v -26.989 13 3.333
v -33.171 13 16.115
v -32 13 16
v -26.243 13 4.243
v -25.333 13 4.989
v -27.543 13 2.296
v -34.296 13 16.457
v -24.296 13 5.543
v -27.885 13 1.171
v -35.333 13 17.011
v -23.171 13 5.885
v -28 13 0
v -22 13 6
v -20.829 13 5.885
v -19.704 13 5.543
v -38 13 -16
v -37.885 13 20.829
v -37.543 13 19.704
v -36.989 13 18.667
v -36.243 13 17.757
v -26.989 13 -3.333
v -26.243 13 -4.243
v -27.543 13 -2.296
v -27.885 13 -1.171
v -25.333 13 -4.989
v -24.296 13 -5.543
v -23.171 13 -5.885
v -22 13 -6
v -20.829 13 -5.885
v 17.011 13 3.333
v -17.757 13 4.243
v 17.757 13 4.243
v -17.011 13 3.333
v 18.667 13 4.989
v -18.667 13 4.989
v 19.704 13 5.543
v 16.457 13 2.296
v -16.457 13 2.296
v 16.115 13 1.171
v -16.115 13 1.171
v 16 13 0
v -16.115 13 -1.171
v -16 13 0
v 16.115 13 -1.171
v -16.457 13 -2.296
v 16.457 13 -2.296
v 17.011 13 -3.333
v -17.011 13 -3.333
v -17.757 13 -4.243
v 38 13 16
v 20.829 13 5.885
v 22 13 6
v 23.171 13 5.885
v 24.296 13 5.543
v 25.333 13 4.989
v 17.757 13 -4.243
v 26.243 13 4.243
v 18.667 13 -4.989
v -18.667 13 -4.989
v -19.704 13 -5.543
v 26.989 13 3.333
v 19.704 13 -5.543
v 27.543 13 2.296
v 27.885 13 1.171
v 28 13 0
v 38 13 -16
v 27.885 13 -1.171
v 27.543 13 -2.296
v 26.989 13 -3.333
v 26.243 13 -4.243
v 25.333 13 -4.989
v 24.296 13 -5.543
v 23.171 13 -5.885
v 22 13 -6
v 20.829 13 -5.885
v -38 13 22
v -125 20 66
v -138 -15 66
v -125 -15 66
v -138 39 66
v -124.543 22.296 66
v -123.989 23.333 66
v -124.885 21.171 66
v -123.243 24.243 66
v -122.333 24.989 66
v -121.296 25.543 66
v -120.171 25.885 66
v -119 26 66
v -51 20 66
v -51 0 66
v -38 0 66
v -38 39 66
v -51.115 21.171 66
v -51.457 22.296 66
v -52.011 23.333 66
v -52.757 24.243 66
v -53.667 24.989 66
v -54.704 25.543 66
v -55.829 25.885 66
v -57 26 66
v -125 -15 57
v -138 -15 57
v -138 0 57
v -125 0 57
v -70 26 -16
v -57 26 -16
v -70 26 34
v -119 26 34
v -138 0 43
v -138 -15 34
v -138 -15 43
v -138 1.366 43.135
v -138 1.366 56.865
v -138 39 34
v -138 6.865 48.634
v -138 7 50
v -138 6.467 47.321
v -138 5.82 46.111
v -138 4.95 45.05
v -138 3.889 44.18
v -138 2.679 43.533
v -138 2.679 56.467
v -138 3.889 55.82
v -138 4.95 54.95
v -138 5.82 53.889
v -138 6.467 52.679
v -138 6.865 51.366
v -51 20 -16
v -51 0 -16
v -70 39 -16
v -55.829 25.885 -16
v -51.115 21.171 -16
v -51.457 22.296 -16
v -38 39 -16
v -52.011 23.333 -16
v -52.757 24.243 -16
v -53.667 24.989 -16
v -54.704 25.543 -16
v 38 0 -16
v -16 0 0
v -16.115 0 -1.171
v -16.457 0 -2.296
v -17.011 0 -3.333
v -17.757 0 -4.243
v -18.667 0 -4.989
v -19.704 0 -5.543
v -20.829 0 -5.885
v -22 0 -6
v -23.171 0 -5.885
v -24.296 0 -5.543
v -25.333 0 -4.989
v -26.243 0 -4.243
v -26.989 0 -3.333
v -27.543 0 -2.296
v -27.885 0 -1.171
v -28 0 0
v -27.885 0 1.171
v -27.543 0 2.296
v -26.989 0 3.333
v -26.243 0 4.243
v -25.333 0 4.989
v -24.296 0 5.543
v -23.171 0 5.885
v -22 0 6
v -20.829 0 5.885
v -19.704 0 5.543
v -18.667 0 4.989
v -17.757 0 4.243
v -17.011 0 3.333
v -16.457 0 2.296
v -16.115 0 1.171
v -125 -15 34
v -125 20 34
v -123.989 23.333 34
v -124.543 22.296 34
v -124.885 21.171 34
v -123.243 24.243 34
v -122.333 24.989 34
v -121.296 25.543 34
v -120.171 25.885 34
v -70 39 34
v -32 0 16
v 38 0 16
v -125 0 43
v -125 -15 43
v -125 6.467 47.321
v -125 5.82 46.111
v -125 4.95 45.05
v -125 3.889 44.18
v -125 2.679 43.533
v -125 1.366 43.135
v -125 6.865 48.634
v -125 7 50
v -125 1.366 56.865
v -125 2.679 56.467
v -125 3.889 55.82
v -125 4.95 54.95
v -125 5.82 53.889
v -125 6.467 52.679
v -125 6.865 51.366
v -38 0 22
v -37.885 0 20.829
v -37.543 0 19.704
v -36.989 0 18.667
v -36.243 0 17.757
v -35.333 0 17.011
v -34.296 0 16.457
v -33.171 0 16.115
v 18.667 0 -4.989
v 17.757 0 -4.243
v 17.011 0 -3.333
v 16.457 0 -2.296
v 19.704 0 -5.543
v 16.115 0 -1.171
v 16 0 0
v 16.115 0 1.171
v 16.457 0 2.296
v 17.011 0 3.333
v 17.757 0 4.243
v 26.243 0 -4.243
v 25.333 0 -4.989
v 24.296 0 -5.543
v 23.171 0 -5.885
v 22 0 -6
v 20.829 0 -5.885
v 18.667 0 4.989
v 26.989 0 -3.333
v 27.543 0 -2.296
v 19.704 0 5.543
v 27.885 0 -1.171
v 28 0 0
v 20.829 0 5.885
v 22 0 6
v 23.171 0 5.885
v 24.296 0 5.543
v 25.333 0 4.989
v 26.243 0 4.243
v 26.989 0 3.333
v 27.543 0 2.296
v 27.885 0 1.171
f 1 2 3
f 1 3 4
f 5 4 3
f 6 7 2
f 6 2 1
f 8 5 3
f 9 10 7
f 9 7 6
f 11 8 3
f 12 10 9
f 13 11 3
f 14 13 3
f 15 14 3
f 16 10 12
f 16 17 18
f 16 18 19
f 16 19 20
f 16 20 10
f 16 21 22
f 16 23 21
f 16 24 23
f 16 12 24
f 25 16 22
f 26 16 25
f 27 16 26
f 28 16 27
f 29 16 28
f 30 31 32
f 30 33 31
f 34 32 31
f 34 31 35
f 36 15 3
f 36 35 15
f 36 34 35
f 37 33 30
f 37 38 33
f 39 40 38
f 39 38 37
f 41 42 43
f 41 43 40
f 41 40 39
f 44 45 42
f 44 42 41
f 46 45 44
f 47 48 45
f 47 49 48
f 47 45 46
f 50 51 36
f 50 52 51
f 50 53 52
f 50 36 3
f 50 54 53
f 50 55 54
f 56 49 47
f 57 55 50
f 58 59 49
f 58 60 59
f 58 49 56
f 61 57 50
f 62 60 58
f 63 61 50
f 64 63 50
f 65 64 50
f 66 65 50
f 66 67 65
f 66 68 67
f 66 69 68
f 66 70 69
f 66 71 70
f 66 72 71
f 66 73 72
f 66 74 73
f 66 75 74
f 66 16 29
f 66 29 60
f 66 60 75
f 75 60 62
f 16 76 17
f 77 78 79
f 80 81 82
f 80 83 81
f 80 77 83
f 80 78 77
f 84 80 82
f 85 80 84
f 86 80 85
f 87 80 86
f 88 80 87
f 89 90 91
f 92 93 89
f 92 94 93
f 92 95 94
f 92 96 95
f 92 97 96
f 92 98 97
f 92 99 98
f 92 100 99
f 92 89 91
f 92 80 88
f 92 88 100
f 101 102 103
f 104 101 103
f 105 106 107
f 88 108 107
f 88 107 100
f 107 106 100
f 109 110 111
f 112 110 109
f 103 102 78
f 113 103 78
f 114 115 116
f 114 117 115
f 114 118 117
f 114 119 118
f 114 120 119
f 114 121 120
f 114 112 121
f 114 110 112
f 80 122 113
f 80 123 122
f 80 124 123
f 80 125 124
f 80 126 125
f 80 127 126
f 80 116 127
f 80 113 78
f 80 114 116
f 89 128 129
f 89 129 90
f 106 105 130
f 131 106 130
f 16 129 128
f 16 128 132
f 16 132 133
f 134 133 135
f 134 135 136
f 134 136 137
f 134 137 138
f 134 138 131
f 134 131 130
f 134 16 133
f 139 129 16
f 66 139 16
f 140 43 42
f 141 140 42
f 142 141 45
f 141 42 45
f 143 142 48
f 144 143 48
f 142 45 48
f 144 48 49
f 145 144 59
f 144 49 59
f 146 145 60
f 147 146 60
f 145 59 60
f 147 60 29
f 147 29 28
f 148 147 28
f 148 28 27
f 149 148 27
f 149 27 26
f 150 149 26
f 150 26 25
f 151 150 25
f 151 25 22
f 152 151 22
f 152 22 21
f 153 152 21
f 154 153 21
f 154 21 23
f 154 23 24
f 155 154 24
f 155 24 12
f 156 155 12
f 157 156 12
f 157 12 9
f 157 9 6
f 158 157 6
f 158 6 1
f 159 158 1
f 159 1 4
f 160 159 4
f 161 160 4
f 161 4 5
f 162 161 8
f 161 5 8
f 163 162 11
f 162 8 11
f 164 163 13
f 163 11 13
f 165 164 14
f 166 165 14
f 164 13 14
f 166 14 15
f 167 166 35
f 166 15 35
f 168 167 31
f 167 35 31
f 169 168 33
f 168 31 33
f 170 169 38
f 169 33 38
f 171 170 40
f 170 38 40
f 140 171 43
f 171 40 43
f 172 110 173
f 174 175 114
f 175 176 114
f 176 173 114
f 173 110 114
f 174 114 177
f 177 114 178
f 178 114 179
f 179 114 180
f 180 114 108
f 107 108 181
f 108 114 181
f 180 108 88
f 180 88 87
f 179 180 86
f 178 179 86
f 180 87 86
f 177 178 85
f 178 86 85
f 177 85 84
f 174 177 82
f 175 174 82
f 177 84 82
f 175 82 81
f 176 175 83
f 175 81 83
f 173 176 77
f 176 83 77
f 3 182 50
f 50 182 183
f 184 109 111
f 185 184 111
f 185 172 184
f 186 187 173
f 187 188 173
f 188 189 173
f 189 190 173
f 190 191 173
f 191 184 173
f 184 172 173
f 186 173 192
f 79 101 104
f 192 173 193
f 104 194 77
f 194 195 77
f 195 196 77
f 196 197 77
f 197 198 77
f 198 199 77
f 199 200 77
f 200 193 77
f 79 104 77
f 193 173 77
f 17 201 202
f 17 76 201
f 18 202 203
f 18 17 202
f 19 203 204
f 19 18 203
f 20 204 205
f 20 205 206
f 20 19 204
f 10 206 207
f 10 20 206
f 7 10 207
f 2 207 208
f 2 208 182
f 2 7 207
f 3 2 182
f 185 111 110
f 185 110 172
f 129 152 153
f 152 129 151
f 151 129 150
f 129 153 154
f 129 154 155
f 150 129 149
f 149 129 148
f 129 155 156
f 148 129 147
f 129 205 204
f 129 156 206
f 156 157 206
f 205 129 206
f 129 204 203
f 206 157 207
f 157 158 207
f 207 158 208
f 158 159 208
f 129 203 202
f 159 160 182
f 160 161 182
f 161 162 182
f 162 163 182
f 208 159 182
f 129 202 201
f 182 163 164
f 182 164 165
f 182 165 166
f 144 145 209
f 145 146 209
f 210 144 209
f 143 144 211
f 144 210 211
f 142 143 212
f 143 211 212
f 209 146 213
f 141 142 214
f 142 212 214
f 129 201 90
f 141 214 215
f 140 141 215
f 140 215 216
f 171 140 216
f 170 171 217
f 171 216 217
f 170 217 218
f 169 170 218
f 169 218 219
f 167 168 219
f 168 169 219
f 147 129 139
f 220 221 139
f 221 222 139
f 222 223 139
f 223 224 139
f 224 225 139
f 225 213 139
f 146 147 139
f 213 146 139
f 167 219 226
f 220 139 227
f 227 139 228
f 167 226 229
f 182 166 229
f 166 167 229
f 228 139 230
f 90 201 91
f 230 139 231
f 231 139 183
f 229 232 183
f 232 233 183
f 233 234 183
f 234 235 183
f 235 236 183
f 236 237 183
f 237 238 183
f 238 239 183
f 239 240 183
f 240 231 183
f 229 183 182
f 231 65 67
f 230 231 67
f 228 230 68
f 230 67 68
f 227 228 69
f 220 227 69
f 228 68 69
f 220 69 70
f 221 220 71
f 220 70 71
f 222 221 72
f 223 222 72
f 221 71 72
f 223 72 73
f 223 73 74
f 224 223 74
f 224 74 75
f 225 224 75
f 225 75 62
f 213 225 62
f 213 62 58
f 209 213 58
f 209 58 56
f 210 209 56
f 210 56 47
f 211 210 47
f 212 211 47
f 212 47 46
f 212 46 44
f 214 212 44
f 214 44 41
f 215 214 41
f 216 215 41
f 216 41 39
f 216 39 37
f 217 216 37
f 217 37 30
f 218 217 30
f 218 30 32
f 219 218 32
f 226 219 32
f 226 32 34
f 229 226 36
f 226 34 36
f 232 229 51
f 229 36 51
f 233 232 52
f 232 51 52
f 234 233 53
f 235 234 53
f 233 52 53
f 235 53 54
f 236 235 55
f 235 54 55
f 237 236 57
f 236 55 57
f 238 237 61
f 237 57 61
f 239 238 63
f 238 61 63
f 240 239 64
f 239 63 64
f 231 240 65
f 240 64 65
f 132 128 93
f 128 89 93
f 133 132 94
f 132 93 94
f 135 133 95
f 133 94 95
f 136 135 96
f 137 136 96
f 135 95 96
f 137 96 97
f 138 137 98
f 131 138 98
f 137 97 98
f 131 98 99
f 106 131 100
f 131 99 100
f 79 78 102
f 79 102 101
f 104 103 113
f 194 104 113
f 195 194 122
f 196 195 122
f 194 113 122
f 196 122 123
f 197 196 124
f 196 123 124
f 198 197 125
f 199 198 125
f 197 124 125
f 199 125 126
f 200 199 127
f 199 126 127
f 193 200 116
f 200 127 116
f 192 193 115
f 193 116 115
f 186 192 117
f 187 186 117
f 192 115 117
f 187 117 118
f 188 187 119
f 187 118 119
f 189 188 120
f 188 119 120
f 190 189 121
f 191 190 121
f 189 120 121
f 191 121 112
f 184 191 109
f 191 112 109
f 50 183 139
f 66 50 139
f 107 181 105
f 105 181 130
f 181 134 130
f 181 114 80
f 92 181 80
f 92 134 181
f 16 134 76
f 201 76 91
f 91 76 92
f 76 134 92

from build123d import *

# Parameters (mm, degrees)
SKETCH1_W                      = 76
SKETCH1_H                      = 32
BOSS_EXTRUDE1_DEPTH            = 13
SKETCH2_R                      = 6
CUT_EXTRUDE1_DEPTH             = 1
CUT_EXTRUDE1_DEPTH_BACK        = 14
SKETCH3_W                      = 82
SKETCH3_H                      = 39
BOSS_EXTRUDE2_DEPTH            = 13
SKETCH4_W                      = 82
SKETCH4_H                      = 13
BOSS_EXTRUDE3_DEPTH            = 87
SKETCH5_W                      = 68
SKETCH5_H                      = 50
CUT_EXTRUDE2_DEPTH             = 1
CUT_EXTRUDE2_DEPTH_BACK        = 40
SKETCH6_W                      = 13
SKETCH6_H                      = 32
BOSS_EXTRUDE4_DEPTH            = 41
FILLET1_R                      = 6
CUT_EXTRUDE3_REACH             = 178
CUT_EXTRUDE3_DIRECTION_2_DEPTH = 1


with BuildPart() as part:
    # Sketch1 → Boss-Extrude1 (new body)
    with BuildSketch(Plane(origin=(0, 0, 0), x_dir=(1, 0, 0), z_dir=(0, 1, 0))):
        Rectangle(SKETCH1_W, SKETCH1_H)
    extrude(amount=BOSS_EXTRUDE1_DEPTH)

    # Sketch2 → Cut-Extrude1 (cut, two sides)
    with BuildSketch(Plane(origin=(0, 13, 0), x_dir=(1, 0, 0), z_dir=(0, 1, 0))) as cut_extrude1_sk:
        with Locations((-22, 0)):
            Circle(SKETCH2_R)
        with Locations((22, 0)):
            Circle(SKETCH2_R)
    extrude(amount=CUT_EXTRUDE1_DEPTH, mode=Mode.SUBTRACT)
    extrude(cut_extrude1_sk.sketch, amount=-CUT_EXTRUDE1_DEPTH_BACK, mode=Mode.SUBTRACT)

    # Sketch3 → Boss-Extrude2 (add)
    with BuildSketch(Plane.ZY.offset(38)):
        with Locations((25, 19.5)):
            Rectangle(SKETCH3_W, SKETCH3_H)
    extrude(amount=BOSS_EXTRUDE2_DEPTH)

    # Sketch4 → Boss-Extrude3 (add)
    with BuildSketch(Plane.ZY.offset(51)):
        with Locations((25, 32.5)):
            Rectangle(SKETCH4_W, SKETCH4_H)
    extrude(amount=BOSS_EXTRUDE3_DEPTH)

    # Sketch5 → Cut-Extrude2 (cut, two sides)
    with BuildSketch(Plane(origin=(0, 39, 0), x_dir=(1, 0, 0), z_dir=(0, 1, 0))) as cut_extrude2_sk:
        with Locations((-104, -9)):
            Rectangle(SKETCH5_W, SKETCH5_H)
    extrude(amount=CUT_EXTRUDE2_DEPTH, mode=Mode.SUBTRACT)
    extrude(cut_extrude2_sk.sketch, amount=-CUT_EXTRUDE2_DEPTH_BACK, mode=Mode.SUBTRACT)

    # Sketch6 → Boss-Extrude4 (add)
    with BuildSketch(Plane.XZ.offset(-26)):
        with Locations((-131.5, 50)):
            Rectangle(SKETCH6_W, SKETCH6_H)
    extrude(amount=BOSS_EXTRUDE4_DEPTH)

    # Fillet1
    fillet1_edges = [part.edges().sort_by_distance(p)[0] for p in [
        (-51, 26, 25),
        (-38, 6.5, 16),
        (-125, 26, 50),
    ]]
    fillet(fillet1_edges, radius=FILLET1_R)

    # Sketch7 → Cut-Extrude3 (cut, up to next)
    with BuildSketch(Plane.ZY.offset(138), mode=Mode.PRIVATE) as cut_extrude3_sk1:
        with BuildLine():
            Line((43, 0), (43, -15))
            Line((43, -15), (57, -15))
            Line((57, -15), (57, 0))
            ThreePointArc((57, 0), (50, 7), (43, 0))
        make_face()
    cut_extrude3_tool1 = extrude(cut_extrude3_sk1.sketch, amount=-CUT_EXTRUDE3_REACH, mode=Mode.PRIVATE) & part.part
    add(cut_extrude3_tool1.solids().sort_by_distance((-138, -4.691563, 50))[0], mode=Mode.SUBTRACT)

    # Sketch7 → Cut-Extrude3 direction 2 (cut)
    with BuildSketch(Plane.ZY.offset(138)):
        with BuildLine():
            Line((43, 0), (43, -15))
            Line((43, -15), (57, -15))
            Line((57, -15), (57, 0))
            ThreePointArc((57, 0), (50, 7), (43, 0))
        make_face()
    extrude(amount=CUT_EXTRUDE3_DIRECTION_2_DEPTH, mode=Mode.SUBTRACT)


solid = part.part
